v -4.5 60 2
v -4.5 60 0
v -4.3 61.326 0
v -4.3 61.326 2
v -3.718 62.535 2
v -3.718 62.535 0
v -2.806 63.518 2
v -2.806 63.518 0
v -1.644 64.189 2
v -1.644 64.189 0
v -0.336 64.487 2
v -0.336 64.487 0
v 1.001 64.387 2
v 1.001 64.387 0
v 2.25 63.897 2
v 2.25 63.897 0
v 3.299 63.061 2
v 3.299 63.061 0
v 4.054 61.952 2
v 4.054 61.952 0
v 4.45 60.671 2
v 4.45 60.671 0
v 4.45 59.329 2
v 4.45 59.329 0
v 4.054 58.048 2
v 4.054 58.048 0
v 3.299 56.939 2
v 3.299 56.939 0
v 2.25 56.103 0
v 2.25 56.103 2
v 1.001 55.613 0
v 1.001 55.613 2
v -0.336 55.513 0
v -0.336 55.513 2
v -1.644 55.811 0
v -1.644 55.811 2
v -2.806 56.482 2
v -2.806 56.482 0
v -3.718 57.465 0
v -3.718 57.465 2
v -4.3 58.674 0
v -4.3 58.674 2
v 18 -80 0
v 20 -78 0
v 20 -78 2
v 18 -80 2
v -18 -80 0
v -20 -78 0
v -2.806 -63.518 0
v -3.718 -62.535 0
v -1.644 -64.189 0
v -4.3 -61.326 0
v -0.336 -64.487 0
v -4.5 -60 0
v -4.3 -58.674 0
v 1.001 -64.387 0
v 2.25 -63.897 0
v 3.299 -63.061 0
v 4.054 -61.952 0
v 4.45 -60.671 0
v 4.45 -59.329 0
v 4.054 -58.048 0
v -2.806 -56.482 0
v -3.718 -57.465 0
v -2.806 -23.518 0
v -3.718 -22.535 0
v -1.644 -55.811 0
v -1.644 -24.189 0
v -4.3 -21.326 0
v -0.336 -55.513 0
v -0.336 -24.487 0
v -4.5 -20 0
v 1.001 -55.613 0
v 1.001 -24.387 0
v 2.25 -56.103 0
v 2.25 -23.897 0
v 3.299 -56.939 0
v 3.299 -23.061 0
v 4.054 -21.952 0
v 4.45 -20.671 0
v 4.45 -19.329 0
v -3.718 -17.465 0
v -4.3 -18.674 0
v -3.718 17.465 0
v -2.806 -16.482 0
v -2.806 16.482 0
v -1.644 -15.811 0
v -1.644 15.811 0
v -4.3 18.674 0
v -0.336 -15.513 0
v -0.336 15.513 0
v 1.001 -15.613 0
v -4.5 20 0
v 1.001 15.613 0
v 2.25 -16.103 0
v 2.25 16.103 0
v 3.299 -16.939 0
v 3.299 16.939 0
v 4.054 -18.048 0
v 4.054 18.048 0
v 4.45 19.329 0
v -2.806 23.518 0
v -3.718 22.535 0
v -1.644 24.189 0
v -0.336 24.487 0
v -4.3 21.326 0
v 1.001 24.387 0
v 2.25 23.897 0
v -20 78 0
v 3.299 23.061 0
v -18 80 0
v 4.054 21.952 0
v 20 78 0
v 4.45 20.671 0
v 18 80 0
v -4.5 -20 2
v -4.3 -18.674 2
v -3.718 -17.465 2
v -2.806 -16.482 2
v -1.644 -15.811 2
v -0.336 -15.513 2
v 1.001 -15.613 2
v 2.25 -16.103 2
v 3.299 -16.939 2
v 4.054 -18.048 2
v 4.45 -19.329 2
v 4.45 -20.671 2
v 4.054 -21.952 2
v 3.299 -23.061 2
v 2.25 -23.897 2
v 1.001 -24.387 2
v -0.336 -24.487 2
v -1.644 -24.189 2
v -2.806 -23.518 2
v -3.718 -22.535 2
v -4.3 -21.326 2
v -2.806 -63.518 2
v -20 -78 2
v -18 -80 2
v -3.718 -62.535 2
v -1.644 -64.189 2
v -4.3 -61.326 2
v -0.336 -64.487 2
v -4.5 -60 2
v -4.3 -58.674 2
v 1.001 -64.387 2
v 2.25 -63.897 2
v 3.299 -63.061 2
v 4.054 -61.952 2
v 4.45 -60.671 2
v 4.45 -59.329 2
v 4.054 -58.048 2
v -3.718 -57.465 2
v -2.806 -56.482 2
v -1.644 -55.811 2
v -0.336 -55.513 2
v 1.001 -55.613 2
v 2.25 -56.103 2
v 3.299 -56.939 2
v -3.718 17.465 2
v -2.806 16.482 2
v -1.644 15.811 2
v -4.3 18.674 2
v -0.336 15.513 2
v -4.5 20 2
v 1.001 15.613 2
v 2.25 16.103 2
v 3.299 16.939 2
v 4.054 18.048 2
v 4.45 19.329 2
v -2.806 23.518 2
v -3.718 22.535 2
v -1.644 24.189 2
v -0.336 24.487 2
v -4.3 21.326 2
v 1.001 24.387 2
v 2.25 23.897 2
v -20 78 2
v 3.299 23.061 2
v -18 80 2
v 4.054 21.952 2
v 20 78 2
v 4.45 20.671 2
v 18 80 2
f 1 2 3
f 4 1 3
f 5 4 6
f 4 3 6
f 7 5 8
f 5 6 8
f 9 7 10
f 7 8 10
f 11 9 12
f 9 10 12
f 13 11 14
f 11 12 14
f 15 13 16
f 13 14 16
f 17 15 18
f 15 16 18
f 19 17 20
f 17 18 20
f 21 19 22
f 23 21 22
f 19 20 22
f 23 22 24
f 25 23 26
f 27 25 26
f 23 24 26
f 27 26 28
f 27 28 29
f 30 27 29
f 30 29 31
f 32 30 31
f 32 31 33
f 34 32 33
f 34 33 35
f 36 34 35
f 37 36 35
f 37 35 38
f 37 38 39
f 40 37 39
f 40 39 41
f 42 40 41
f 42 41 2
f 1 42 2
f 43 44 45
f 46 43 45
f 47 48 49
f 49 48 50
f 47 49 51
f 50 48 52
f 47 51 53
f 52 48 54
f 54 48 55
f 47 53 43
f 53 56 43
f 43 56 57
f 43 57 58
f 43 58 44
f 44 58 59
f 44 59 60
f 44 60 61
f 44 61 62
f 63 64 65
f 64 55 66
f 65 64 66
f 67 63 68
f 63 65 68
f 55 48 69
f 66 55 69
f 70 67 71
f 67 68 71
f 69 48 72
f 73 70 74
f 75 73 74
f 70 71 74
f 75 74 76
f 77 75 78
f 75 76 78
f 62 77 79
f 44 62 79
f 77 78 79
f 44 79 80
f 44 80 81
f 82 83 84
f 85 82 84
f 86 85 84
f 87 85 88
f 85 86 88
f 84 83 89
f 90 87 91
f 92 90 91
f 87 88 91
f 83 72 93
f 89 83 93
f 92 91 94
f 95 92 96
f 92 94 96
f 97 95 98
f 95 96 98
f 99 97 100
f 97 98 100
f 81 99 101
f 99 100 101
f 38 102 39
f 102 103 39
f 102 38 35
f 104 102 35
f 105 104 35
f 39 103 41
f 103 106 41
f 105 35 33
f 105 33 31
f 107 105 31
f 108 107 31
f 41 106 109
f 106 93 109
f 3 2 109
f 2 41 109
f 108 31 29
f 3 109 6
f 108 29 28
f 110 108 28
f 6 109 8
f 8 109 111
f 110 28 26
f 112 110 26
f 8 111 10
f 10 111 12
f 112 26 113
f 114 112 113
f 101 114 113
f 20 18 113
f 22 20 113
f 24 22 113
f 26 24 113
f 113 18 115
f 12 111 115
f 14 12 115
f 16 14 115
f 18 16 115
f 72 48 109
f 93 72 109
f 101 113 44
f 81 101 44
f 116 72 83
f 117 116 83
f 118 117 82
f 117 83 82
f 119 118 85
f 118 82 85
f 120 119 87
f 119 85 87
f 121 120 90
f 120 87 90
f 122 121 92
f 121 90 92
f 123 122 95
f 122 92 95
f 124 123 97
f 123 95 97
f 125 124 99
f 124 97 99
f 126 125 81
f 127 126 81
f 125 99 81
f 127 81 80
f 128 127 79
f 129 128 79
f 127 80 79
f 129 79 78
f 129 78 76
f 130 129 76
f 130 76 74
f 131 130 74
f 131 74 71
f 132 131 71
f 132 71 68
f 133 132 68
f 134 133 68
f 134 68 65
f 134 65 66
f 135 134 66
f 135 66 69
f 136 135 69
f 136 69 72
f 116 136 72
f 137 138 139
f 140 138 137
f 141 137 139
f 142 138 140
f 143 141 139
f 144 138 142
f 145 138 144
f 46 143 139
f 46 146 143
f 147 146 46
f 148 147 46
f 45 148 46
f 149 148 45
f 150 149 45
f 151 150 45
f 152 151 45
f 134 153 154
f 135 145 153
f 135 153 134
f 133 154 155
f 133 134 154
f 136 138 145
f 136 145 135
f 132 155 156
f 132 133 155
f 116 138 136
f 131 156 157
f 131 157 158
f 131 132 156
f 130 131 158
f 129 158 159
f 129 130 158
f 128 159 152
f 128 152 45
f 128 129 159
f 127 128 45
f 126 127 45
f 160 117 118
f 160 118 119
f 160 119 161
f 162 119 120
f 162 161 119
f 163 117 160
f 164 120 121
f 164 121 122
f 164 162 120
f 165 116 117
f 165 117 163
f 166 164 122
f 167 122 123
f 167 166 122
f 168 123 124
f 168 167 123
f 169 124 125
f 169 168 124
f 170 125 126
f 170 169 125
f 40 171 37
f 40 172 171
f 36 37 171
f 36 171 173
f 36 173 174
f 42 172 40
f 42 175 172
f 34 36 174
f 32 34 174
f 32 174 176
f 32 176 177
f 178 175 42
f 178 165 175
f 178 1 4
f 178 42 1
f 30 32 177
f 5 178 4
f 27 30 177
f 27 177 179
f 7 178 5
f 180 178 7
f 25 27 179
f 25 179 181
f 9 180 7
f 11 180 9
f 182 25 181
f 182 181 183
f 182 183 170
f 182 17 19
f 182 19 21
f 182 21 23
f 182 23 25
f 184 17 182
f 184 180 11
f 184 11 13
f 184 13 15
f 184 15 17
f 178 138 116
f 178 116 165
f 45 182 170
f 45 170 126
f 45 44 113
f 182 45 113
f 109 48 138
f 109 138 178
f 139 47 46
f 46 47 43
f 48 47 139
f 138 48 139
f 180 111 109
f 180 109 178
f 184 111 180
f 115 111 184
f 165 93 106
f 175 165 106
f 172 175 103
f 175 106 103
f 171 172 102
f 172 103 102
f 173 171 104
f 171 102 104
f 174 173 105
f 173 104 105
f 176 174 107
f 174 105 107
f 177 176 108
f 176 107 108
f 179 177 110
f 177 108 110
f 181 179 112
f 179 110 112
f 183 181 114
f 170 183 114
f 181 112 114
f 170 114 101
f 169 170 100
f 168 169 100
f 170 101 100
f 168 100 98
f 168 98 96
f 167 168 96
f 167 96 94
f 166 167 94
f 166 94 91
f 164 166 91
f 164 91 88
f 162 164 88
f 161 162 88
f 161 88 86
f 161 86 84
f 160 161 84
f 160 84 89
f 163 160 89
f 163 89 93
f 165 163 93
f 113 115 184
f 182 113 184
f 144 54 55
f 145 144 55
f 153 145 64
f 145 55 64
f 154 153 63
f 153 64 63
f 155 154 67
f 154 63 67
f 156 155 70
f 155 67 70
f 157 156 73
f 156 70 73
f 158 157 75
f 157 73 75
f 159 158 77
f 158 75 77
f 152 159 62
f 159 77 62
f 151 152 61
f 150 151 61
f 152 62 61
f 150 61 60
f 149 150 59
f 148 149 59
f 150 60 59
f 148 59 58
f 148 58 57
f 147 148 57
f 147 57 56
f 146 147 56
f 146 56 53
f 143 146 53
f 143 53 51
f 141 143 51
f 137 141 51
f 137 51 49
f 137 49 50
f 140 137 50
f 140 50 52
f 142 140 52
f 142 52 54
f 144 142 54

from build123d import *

# Parameters (mm, degrees)
SKETCH_1_W        = 40
SKETCH_1_H        = 160
EXTRUDE_1_DEPTH   = 2
CHAMFER_1_SIZE    = 2
HOLE_WIZARD_M81_D = 9


with BuildPart() as part:
    # Эскиз1 → Бобышка-Вытянуть1 (new body)
    with BuildSketch(Plane.XY):
        Rectangle(SKETCH_1_W, SKETCH_1_H)
    extrude(amount=EXTRUDE_1_DEPTH)

    # Фаска1
    chamfer_1_edges = [part.edges().sort_by_distance(p)[0] for p in [
        (20, -80, 1),
        (-20, -80, 1),
        (-20, 80, 1),
        (20, 80, 1),
    ]]
    chamfer(chamfer_1_edges, length=CHAMFER_1_SIZE)

    # Отверстие с зазором M81 (through all)
    with Locations(Plane.XY.offset(2)):
        with Locations((0, -60), (0, 60), (0, 20), (0, -20)):
            Hole(HOLE_WIZARD_M81_D / 2)


solid = part.part
